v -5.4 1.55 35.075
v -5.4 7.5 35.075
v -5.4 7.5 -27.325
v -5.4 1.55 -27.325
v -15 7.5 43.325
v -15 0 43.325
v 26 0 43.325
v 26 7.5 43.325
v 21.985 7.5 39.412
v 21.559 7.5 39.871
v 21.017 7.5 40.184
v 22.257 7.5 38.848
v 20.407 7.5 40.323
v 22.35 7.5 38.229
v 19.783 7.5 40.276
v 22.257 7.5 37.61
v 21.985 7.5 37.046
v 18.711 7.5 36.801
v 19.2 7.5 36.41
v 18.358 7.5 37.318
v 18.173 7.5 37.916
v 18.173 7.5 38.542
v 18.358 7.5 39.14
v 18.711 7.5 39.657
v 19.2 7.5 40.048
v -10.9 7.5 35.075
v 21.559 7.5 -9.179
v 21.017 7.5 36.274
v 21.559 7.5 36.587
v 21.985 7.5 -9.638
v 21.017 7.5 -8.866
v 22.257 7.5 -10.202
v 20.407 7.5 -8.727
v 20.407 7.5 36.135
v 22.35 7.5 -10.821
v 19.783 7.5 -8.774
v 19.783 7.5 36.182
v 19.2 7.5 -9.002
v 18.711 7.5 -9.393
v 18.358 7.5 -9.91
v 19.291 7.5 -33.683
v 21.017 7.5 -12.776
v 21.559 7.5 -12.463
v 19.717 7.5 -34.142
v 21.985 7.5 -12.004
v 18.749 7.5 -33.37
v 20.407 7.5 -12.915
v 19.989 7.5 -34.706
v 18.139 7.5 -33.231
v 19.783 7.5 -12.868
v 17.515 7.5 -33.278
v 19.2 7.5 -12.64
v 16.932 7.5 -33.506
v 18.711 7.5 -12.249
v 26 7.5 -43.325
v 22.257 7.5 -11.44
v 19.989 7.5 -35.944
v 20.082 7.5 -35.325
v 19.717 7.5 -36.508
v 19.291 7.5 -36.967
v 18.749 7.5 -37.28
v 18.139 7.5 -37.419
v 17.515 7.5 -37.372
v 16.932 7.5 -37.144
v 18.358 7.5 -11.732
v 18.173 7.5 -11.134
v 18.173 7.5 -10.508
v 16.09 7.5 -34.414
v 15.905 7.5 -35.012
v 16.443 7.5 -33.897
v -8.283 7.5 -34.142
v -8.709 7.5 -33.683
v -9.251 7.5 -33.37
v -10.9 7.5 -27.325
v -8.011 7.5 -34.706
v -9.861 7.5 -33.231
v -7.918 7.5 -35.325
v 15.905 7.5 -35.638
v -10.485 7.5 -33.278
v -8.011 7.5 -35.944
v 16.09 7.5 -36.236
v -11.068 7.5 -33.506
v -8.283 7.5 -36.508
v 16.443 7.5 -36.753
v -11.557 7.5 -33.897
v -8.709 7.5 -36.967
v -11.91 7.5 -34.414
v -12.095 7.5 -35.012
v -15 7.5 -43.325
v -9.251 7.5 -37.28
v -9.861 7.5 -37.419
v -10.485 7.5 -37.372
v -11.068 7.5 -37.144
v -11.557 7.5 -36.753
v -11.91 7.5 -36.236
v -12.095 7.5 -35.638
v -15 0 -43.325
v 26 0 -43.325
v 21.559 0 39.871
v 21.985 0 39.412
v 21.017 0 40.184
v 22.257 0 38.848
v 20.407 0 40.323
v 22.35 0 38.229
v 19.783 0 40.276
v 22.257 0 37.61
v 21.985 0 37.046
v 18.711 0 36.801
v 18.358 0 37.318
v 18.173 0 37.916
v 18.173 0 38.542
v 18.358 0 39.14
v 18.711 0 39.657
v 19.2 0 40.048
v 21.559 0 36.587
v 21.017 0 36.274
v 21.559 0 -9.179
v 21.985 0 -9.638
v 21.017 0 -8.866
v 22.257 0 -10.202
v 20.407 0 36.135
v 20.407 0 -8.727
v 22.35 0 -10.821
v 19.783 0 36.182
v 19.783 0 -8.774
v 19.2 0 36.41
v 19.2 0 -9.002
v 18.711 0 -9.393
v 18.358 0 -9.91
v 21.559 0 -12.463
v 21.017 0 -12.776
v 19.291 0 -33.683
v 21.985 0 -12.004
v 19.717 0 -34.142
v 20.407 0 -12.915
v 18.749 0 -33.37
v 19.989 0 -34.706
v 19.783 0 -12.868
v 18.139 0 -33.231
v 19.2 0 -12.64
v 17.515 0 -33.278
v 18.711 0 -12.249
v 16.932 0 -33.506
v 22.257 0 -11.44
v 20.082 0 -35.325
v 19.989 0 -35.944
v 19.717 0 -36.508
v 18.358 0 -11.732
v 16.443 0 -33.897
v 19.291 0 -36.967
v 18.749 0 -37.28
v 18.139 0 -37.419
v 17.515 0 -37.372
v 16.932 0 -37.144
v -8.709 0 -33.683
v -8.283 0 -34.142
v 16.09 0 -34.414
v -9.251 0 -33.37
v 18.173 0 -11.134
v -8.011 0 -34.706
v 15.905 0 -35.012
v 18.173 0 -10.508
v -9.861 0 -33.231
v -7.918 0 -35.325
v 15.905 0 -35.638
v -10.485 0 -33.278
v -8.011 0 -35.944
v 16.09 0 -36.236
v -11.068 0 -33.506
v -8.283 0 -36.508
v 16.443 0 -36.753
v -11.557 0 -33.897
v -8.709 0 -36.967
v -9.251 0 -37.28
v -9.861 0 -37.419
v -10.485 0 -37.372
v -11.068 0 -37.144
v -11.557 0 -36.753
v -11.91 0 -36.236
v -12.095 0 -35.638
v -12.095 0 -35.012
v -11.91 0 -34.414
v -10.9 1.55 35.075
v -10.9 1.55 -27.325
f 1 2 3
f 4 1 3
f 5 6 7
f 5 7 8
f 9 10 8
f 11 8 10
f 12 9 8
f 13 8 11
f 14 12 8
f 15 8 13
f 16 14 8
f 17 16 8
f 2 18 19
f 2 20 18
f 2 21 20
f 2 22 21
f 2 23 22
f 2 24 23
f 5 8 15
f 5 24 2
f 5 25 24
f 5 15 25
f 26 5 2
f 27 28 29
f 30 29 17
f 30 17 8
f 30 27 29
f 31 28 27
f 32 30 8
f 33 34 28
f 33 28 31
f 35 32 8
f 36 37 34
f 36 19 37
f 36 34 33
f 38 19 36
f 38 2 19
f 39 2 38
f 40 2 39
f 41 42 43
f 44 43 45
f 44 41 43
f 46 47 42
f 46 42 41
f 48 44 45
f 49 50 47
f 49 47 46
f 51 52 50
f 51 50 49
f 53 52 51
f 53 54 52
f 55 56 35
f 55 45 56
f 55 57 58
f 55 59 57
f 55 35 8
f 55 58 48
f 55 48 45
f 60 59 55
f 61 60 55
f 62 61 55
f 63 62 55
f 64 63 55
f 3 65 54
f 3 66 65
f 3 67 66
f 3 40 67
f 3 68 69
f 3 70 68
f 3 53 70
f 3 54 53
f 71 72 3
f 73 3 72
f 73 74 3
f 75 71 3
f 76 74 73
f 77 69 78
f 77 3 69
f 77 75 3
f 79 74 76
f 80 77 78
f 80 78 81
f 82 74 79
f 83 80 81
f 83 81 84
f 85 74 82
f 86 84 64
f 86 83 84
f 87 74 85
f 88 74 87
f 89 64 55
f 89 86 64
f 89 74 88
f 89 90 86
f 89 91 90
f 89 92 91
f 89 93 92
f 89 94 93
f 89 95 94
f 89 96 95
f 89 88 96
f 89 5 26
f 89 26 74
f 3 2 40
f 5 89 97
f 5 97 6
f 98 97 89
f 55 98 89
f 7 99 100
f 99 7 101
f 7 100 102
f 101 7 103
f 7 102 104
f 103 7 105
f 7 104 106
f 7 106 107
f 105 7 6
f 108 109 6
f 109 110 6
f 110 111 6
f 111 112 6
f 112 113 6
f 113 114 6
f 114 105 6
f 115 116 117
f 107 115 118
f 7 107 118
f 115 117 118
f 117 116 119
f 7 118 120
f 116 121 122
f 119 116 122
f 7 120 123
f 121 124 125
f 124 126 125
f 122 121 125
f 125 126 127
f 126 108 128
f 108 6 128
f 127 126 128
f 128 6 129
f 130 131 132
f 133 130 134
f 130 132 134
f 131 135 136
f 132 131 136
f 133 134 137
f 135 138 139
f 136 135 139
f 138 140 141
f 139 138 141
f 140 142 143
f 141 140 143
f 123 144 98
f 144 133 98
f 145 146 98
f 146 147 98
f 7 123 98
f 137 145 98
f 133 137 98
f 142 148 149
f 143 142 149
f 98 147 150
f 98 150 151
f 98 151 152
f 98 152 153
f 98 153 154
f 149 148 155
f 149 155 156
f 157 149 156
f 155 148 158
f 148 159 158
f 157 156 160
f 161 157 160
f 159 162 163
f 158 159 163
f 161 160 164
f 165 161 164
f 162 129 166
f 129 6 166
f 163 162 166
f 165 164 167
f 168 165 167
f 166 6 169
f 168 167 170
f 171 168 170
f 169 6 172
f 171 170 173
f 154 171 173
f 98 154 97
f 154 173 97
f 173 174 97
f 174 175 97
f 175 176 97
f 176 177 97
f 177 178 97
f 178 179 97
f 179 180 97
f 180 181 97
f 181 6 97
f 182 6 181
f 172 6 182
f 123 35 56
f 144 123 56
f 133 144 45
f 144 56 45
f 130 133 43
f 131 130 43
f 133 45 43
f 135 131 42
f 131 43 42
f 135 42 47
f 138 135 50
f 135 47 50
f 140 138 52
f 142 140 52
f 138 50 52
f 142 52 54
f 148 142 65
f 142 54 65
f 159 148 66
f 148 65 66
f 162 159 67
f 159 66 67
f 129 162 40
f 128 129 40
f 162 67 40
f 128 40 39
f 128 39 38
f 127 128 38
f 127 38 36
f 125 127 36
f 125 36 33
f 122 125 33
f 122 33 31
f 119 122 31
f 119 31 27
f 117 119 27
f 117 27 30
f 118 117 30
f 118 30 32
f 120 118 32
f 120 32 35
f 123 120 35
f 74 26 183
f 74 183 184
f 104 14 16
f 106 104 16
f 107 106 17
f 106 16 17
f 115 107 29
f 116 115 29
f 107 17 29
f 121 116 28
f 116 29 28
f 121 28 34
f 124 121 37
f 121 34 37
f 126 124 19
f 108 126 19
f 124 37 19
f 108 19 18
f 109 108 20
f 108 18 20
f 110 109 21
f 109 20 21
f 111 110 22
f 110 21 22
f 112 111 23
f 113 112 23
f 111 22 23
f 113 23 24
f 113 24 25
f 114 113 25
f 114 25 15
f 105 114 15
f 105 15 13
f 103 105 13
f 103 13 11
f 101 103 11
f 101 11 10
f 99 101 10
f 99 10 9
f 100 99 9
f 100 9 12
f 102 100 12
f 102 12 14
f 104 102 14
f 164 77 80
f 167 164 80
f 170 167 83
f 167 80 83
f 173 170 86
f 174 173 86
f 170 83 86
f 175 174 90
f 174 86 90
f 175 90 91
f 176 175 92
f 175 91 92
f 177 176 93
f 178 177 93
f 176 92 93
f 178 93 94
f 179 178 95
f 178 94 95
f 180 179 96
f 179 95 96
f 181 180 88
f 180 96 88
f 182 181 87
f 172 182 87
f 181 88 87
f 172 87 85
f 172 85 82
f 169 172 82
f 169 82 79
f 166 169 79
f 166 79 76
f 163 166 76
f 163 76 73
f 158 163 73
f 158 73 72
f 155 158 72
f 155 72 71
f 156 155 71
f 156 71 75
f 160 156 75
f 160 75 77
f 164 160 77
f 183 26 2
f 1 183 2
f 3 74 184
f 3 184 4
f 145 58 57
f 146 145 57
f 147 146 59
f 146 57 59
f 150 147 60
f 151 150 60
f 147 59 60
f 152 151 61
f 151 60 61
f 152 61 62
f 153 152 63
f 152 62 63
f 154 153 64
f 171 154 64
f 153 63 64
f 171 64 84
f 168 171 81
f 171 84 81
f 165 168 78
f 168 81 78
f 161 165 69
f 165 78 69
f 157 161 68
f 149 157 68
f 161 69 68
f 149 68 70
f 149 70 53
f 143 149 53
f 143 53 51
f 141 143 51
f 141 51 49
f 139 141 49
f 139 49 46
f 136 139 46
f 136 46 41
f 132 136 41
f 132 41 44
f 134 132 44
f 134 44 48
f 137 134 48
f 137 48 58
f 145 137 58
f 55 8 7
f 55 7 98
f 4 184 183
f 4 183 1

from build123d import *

# Parameters (mm, degrees)
SKETCH1_W           = 50
SKETCH1_H           = 86.65
BOSS_EXTRUDE1_DEPTH = 7.5
SKETCH7_W           = 5.5
SKETCH7_H           = 62.4
CUT_EXTRUDE5_DEPTH  = 5.95
SKETCH11_R          = 2.1
CUT_EXTRUDE8_DEPTH  = 8.5
SKETCH12_R          = 2.1
CUT_EXTRUDE10_DEPTH = 8.5
SKETCH13_W          = 86.65
SKETCH13_H          = 7.5
BOSS_EXTRUDE2_DEPTH = 1
SKETCH14_W          = 86.65
SKETCH14_H          = 7.5
CUT_EXTRUDE11_DEPTH = 10


with BuildPart() as part:
    # Sketch1 → Boss-Extrude1 (new body)
    with BuildSketch(Plane(origin=(0, 0, 0), x_dir=(1, 0, 0), z_dir=(0, 1, 0))):
        Rectangle(SKETCH1_W, SKETCH1_H)
    extrude(amount=BOSS_EXTRUDE1_DEPTH)

    # Sketch7 → Cut-Extrude5 (cut)
    with BuildSketch(Plane(origin=(0, 7.5, 0), x_dir=(1, 0, 0), z_dir=(0, 1, 0))):
        with Locations((-8.15, -3.875)):
            Rectangle(SKETCH7_W, SKETCH7_H)
    extrude(amount=-CUT_EXTRUDE5_DEPTH, mode=Mode.SUBTRACT)

    # Sketch11 → Cut-Extrude8 (cut, through all)
    with BuildSketch(Plane(origin=(0, 7.5, 0), x_dir=(1, 0, 0), z_dir=(0, 1, 0))):
        with Locations((17.982, 35.325)):
            Circle(SKETCH11_R)
        with Locations((-10.018, 35.325)):
            Circle(SKETCH11_R)
    extrude(amount=-CUT_EXTRUDE8_DEPTH, mode=Mode.SUBTRACT)

    # Sketch12 → Cut-Extrude10 (cut, through all)
    with BuildSketch(Plane(origin=(0, 7.5, 0), x_dir=(1, 0, 0), z_dir=(0, 1, 0))):
        with Locations((20.25, 10.821)):
            Circle(SKETCH12_R)
        with Locations((20.25, -38.229)):
            Circle(SKETCH12_R)
    extrude(amount=-CUT_EXTRUDE10_DEPTH, mode=Mode.SUBTRACT)

    # Sketch13 → Boss-Extrude2 (add)
    with BuildSketch(Plane(origin=(25, 0, 0), x_dir=(0, 0, -1), z_dir=(1, 0, 0))):
        with Locations((0, 3.75)):
            Rectangle(SKETCH13_W, SKETCH13_H)
    extrude(amount=BOSS_EXTRUDE2_DEPTH)

    # Sketch14 → Cut-Extrude11 (cut)
    with BuildSketch(Plane.ZY.offset(25)):
        with Locations((0, 3.75)):
            Rectangle(SKETCH14_W, SKETCH14_H)
    extrude(amount=-CUT_EXTRUDE11_DEPTH, mode=Mode.SUBTRACT)


solid = part.part
